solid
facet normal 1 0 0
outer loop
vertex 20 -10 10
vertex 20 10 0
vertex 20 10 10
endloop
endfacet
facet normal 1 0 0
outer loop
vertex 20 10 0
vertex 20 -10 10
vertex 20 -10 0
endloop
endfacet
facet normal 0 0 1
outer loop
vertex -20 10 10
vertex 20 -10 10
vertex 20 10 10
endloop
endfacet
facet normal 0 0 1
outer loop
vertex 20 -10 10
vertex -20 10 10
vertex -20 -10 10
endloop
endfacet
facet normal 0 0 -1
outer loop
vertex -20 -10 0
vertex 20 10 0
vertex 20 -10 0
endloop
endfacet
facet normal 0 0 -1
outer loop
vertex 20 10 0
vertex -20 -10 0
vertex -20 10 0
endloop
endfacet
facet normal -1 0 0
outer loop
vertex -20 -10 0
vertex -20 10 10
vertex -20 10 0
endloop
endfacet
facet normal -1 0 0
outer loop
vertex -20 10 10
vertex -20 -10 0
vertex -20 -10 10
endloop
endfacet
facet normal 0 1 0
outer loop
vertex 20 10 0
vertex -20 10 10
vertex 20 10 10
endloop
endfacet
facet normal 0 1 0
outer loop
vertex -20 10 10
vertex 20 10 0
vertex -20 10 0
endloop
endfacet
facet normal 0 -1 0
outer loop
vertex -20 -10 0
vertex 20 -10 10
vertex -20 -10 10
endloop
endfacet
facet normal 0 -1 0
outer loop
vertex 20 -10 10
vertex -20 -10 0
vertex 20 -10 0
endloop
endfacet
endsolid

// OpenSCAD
// Forme base del modulo IA (pagina IA 3D): blocco, piastra, cilindro, tubo, sfera, cono.
// I parametri arrivano dal server (Services/FormeBaseIa3d.cs) con -D nome=valore, già
// controllati; anche i centri dei fori li calcola il server (posizioni_fori).
// Il pezzo è centrato sull'origine e appoggiato su z = 0.
forma = "blocco";
larghezza = 40;
profondita = 20;
altezza = 10;
diametro = 20;
diametro_interno = 0;
diametro_cima = 0;
raggio_angoli = 0;
fori = 0;
diametro_fori = 4;
posizione_fori = "centro";
posizioni_fori = [];   // [[x, y], ...] in mm, rispetto al centro del pezzo

$fn = 96;

// Rettangolo l × p alto h, centrato, con gli angoli arrotondati di raggio r.
module rettangolo(l, p, r, h) {
    if (r <= 0)
        translate([-l / 2, -p / 2, 0]) cube([l, p, h]);
    else
        hull()
            for (x = [-l / 2 + r, l / 2 - r], y = [-p / 2 + r, p / 2 - r])
                translate([x, y, 0]) cylinder(r = r, h = h);
}

// Fori passanti, da sottrarre a un pezzo alto h.
module fori_passanti(h) {
    for (f = posizioni_fori)
        translate([f[0], f[1], -1]) cylinder(d = diametro_fori, h = h + 2, $fn = 48);
}

if (forma == "blocco" || forma == "piastra") {
    difference() {
        rettangolo(larghezza, profondita, raggio_angoli, altezza);
        fori_passanti(altezza);
    }
} else if (forma == "cilindro") {
    difference() {
        cylinder(d = diametro, h = altezza);
        fori_passanti(altezza);
    }
} else if (forma == "tubo") {
    difference() {
        cylinder(d = diametro, h = altezza);
        translate([0, 0, -1]) cylinder(d = diametro_interno, h = altezza + 2);
    }
} else if (forma == "sfera") {
    translate([0, 0, diametro / 2]) sphere(d = diametro);
} else if (forma == "cono") {
    cylinder(d1 = diametro, d2 = diametro_cima, h = altezza);
}
